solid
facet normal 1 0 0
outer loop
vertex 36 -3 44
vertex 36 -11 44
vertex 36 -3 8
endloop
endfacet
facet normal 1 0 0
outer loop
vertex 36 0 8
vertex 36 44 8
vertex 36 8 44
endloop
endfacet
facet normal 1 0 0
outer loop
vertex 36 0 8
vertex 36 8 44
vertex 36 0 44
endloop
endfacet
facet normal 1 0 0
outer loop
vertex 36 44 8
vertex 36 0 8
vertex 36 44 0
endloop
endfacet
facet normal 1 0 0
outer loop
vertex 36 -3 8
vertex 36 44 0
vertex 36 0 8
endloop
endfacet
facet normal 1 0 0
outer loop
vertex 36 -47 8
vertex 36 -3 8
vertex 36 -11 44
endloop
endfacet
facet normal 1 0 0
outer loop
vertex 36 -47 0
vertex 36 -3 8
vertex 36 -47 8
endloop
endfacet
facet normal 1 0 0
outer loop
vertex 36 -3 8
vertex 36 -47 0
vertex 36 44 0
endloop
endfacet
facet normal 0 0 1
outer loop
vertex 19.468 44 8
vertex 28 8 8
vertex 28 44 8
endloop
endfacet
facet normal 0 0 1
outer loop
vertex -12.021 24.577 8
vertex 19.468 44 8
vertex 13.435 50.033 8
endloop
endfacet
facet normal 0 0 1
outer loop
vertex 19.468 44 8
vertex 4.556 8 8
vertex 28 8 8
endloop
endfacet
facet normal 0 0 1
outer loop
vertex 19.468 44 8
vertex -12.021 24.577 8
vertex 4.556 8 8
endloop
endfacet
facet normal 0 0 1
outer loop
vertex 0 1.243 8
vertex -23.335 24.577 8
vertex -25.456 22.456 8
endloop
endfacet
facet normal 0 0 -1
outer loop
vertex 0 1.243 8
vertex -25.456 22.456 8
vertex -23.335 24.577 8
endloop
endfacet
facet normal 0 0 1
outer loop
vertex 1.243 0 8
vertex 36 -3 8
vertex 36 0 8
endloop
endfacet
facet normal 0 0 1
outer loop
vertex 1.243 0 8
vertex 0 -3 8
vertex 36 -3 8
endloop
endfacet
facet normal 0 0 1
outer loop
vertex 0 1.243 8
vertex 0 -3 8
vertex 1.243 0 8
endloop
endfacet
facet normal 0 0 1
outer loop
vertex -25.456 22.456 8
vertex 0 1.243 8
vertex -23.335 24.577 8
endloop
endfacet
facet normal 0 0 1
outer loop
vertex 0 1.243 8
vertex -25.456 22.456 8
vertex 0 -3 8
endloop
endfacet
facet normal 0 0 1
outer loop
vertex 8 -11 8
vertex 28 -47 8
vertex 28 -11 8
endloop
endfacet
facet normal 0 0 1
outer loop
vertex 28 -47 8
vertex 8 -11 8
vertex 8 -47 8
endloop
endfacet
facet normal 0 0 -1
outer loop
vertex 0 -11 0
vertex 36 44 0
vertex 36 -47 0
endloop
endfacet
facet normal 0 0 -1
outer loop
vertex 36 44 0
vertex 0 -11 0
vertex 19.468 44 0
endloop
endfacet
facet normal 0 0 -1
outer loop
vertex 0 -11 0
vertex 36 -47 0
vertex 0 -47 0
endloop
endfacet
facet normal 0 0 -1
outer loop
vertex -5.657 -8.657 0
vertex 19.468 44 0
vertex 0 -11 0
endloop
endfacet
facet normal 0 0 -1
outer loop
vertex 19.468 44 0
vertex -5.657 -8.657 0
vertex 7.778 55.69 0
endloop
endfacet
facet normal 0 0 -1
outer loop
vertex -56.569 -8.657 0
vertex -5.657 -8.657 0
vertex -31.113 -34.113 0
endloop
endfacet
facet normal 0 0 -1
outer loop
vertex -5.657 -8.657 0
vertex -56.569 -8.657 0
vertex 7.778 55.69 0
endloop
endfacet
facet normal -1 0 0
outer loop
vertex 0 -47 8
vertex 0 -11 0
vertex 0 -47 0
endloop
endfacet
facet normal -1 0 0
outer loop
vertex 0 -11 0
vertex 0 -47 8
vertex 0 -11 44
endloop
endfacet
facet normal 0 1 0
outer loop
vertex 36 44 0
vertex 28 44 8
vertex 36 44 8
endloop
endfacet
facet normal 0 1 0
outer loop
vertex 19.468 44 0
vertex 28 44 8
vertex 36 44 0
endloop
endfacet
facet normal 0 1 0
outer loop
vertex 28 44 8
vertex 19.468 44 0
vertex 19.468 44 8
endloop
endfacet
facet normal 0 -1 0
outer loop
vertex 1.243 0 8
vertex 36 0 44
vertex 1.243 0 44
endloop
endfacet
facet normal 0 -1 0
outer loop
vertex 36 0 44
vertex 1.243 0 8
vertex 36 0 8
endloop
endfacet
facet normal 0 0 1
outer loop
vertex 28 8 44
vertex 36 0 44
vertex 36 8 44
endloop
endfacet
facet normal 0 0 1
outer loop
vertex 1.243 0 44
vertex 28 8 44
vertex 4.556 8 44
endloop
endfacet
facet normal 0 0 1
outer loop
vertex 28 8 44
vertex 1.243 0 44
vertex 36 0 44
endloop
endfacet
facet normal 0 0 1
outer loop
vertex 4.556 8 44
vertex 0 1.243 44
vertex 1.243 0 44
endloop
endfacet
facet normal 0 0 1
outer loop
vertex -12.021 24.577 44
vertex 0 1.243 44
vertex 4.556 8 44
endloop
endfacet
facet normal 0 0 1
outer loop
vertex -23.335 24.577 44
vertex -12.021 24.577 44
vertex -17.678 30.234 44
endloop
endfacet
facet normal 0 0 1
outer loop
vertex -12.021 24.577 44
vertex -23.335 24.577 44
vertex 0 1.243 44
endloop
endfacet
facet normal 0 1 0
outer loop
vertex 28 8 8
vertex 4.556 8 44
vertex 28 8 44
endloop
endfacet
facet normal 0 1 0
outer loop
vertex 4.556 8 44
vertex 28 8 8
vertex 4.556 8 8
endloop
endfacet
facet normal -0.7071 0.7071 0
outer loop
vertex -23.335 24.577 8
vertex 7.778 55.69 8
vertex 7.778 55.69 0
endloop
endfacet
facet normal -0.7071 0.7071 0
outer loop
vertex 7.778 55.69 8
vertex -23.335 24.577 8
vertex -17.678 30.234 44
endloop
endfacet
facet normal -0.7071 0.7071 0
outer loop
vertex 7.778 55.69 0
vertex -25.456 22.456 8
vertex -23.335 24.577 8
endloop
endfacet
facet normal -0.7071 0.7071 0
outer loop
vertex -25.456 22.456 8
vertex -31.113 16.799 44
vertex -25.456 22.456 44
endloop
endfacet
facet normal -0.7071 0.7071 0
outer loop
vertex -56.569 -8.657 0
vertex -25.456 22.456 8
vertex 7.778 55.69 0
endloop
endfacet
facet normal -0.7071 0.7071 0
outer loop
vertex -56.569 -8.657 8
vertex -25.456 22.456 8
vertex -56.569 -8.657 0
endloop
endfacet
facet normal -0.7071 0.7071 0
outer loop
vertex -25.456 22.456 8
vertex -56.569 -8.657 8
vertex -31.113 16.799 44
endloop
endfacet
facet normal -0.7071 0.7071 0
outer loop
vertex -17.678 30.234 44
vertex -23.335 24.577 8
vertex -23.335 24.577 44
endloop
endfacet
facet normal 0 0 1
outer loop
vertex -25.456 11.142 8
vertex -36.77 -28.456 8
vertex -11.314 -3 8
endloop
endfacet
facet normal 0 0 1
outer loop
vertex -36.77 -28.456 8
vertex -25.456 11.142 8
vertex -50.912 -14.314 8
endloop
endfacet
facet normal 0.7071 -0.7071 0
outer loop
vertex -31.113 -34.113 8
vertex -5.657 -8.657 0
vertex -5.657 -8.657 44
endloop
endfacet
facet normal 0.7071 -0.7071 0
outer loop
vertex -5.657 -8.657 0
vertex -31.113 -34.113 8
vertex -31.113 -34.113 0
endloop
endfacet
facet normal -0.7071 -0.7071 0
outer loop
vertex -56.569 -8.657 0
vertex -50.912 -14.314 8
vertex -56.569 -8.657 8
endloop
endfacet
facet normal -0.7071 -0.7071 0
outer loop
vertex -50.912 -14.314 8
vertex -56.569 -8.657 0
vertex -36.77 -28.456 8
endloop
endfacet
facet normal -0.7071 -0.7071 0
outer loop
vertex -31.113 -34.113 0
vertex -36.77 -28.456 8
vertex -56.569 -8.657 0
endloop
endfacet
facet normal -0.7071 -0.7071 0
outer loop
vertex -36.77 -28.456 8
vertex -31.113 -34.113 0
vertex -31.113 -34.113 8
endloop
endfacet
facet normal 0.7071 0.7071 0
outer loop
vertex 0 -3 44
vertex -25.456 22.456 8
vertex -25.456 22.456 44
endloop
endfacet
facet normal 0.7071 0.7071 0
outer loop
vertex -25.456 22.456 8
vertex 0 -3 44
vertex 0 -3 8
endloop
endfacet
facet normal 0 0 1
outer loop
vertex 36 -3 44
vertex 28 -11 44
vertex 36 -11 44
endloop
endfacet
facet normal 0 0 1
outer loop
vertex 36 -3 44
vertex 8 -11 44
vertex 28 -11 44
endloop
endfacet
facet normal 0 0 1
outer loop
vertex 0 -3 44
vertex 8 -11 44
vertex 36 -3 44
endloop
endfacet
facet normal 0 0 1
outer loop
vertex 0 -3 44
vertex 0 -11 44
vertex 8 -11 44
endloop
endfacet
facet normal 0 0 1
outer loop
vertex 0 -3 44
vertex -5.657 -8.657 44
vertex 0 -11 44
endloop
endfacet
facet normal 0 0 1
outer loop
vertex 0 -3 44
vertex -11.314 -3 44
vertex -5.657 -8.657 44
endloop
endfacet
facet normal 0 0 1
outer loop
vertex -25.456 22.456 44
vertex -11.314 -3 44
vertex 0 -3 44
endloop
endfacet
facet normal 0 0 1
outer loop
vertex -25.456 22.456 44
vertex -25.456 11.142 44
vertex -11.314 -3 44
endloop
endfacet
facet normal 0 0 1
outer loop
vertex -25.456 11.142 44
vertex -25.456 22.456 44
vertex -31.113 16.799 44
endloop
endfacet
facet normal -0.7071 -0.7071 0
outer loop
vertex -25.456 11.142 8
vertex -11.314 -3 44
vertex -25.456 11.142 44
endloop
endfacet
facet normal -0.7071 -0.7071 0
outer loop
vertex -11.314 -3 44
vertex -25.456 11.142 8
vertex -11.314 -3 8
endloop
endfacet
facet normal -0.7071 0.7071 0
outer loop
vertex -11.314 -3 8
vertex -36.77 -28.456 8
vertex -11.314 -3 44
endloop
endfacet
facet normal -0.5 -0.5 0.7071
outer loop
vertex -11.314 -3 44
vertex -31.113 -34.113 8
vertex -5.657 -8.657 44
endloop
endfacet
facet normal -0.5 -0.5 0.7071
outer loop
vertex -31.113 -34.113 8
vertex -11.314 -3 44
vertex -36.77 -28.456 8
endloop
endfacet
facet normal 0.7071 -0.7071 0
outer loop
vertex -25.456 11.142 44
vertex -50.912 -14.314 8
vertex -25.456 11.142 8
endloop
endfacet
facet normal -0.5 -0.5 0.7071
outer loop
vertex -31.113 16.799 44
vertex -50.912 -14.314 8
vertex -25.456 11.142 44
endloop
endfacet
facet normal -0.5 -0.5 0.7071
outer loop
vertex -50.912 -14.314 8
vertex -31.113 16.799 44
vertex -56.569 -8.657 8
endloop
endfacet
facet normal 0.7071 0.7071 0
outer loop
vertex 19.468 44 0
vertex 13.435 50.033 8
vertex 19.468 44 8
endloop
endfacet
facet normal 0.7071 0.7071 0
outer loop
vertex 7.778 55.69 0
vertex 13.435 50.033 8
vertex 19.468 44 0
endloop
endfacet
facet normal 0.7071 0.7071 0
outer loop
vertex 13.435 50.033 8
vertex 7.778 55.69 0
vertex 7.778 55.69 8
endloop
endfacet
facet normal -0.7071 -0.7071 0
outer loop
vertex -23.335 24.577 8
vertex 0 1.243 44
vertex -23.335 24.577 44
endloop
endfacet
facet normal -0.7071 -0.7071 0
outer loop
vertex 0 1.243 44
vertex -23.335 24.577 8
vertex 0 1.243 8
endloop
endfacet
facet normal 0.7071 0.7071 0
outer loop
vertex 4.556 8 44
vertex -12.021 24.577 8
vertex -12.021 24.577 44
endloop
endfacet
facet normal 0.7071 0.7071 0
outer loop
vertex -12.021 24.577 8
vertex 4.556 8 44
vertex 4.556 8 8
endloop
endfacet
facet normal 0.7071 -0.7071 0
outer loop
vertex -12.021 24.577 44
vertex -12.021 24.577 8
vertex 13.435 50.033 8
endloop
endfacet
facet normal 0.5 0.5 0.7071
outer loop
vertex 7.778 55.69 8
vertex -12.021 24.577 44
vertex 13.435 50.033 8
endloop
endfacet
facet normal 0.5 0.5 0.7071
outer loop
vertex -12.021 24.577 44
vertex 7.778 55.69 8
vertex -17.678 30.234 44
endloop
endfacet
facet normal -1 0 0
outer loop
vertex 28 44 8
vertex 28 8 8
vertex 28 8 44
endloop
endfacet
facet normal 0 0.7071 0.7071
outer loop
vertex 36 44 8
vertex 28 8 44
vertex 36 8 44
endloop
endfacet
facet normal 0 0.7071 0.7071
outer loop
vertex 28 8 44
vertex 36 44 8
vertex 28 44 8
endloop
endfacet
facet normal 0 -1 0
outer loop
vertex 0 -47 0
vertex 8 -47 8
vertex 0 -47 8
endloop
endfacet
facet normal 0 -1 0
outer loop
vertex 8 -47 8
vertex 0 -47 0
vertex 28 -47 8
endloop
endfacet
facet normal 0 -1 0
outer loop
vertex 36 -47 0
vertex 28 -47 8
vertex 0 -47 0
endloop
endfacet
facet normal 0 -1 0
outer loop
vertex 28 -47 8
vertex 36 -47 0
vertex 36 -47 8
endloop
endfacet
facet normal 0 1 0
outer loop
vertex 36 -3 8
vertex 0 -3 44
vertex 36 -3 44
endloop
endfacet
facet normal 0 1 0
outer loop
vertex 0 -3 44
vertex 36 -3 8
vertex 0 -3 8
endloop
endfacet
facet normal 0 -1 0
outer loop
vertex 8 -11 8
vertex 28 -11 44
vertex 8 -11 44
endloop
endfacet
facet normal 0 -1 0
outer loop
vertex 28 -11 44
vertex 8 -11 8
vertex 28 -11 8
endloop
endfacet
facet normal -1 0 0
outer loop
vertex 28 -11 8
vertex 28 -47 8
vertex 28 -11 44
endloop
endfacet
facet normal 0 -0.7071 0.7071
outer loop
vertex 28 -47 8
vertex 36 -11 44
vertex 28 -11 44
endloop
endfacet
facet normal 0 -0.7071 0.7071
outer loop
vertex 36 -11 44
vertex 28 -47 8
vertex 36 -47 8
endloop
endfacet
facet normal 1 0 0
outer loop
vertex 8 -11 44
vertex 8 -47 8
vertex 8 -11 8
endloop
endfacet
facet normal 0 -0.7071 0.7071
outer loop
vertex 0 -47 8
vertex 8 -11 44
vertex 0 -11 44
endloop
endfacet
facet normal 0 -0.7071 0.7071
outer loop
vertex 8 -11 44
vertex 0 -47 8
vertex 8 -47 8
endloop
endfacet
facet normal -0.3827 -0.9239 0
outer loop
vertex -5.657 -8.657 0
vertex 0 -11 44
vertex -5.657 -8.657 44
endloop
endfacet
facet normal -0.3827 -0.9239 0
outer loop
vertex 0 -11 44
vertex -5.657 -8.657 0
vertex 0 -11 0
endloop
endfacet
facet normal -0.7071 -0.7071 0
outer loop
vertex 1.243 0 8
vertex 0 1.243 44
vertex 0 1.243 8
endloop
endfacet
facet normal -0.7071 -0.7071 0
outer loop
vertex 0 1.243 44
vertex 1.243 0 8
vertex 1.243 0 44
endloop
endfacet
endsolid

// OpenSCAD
$t = 3; //Mimi hat 4mm Plexiglasdicke geschickt
$h = 36;
$th = 8;//$t*2; //8
$ht = $h + $th; //height and width = 50 + 4 (t)

module winkel()
{
cube([$h,$ht,$th]);
cube([$h,$th,$ht]);
}

module stabilizer()
{
translate([$th,0,0])
rotate([0,-90,0])
linear_extrude(height=$th)
polygon([[$th,$ht],[$ht,$th],[0,0]]);
}

module complete(s1=true,s2=true)
{
  winkel();
  if (s1)
    stabilizer();
  if (s2)
  {
    translate([$h-$th,0,0])
    stabilizer();
  }
}

module edgeholder(s1=true,s2=true,s3=true,s4=true)
{
  complete(s1,s2);
  translate([$h,-$t,0])
  rotate([0,0,180])
  complete(s3,s4);

  translate([0,-$ht-$t,0])
  cube([$h,$ht*2+$t,$th]);
}

$breite=800;//80*92cm
$hoehe=920/2;

module window()
{
color("white")
translate([0,-$t,$th])
cube([$breite,$t,$hoehe]);
}

module middleholder()
{
translate([$breite-$h+$th/2,0,0])
edgeholder();
translate([$breite-$th/2,0,0])
edgeholder();
}

module windows()
{
window();
color("silver")
translate([$breite,0,0])
window();
}

//windows();

module total()
{
  translate([0,-$t,0])
  rotate([0,0,135])
  edgeholder(true,true,true,false);

  edgeholder(false,true,true,true);

  color("red")
  linear_extrude(height=$h+$th)
  polygon([[0,-$t],[0,-11],[-5.657,-8.657]]);
}

module glascut()
{
  translate([0,-$t,$th])
  color("blue")
  cube([$h,$t,$h]);

  translate([0,-$t,$th])
  color("blue")
  rotate([0,0,135])
  translate([0,-$t,0])
  cube([$h,$t,$h]);
}

difference()
{
  total();
  glascut();
}

//middleholder();

//translate([$breite*2-$ht,0,0])
//edgeholder();
